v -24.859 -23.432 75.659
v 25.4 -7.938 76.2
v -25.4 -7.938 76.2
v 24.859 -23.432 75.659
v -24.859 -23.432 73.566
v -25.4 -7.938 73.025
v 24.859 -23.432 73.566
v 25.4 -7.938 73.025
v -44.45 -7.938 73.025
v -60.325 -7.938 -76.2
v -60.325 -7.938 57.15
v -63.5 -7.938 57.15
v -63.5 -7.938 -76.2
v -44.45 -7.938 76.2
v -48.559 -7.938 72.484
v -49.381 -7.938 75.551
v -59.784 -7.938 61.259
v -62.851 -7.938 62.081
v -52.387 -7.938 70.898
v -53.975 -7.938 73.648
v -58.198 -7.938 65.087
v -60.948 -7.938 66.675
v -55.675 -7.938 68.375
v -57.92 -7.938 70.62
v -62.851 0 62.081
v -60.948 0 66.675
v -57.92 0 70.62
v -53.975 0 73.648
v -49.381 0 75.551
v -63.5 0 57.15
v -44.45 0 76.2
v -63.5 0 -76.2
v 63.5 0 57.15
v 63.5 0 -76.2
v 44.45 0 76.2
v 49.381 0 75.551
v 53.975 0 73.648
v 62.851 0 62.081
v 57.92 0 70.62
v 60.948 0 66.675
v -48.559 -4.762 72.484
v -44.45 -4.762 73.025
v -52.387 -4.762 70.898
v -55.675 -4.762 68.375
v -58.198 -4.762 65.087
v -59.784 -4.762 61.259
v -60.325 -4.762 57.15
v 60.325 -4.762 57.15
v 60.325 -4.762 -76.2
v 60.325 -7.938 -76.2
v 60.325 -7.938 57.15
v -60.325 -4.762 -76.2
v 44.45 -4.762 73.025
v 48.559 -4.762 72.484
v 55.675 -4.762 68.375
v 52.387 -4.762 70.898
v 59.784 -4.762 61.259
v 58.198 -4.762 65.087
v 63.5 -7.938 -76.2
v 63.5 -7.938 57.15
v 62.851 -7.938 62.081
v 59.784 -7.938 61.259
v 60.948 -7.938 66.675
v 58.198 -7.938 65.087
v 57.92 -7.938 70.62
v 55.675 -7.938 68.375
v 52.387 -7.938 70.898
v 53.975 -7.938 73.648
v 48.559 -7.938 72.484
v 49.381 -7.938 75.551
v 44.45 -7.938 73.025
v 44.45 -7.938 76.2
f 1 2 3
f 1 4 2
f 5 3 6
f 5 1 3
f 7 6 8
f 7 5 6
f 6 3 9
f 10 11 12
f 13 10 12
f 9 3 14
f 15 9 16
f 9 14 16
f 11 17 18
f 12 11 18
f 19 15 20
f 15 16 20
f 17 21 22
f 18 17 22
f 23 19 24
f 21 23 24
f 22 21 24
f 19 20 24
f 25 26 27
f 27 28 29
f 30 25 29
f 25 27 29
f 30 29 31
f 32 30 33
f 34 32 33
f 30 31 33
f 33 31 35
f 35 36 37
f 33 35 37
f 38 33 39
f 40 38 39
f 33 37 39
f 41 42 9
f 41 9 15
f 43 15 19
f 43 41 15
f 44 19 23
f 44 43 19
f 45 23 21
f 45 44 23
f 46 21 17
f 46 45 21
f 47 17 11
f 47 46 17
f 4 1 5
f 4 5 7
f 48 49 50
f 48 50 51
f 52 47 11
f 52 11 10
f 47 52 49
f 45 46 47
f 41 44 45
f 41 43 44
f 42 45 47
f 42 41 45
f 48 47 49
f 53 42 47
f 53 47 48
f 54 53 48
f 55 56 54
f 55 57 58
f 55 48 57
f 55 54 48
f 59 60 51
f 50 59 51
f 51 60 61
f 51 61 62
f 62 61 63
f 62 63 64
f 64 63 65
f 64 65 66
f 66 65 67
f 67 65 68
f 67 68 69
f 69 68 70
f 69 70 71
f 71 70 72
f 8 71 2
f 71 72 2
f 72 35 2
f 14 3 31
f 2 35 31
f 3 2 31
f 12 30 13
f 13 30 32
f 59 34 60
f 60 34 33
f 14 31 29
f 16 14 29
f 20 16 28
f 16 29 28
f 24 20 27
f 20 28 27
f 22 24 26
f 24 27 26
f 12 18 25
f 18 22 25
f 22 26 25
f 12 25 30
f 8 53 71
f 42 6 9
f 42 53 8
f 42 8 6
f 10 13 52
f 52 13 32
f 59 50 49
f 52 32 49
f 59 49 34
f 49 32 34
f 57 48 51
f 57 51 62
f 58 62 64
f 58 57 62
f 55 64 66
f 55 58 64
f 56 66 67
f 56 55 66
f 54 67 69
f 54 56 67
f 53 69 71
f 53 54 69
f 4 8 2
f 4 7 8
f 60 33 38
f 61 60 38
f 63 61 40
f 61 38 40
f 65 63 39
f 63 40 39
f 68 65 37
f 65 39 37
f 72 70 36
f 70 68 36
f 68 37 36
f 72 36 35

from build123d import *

# Parameters (mm, degrees)
F1_DEPTH = 4.7625
F3_DEPTH = 7.9375
F4_W     = 50.8
F4_H     = 3.175
F5_DEPTH = 15.494
F5_TAPER = 2


with BuildPart() as f1:
    # F0 (on Front) → F1 (new body)
    with BuildSketch(Plane.XZ):
        with BuildLine():
            Line((-63.5, -76.2), (63.5, -76.2))
            Line((63.5, -76.2), (63.5, 57.15))
            ThreePointArc((63.5, 57.15), (57.9203841816, 70.6203841816), (44.45, 76.2))
            Line((44.45, 76.2), (-44.45, 76.2))
            ThreePointArc((-44.45, 76.2), (-57.9203841816, 70.6203841816), (-63.5, 57.15))
            Line((-63.5, 57.15), (-63.5, -76.2))
        make_face()
    extrude(amount=F1_DEPTH)

    # F2 (on face) → F3 (join)
    with BuildSketch(Plane(origin=(0, 0, 0), x_dir=(-1, 0, 0), z_dir=(0, 1, 0))):
        with BuildLine():
            ThreePointArc((-44.45, 76.2), (-57.9203841816, 70.6203841816), (-63.5, 57.15))
            Line((-63.5, 57.15), (-63.5, -76.2))
            Line((-63.5, -76.2), (-60.325, -76.2))
            Line((-60.325, -76.2), (-60.325, 57.15))
            ThreePointArc((-60.325, 57.15), (-55.6753201513, 68.3753201513), (-44.45, 73.025))
            Line((-44.45, 73.025), (44.45, 73.025))
            ThreePointArc((44.45, 73.025), (55.6753201513, 68.3753201513), (60.325, 57.15))
            Line((60.325, 57.15), (60.325, -76.2))
            Line((60.325, -76.2), (63.5, -76.2))
            Line((63.5, -76.2), (63.5, 57.15))
            ThreePointArc((63.5, 57.15), (57.9203841816, 70.6203841816), (44.45, 76.2))
            Line((44.45, 76.2), (-44.45, 76.2))
        make_face()
    extrude(amount=-F3_DEPTH)

    # F4 (on face) → F5 (join)
    with BuildSketch(Plane.XZ.offset(7.9375)):
        with Locations((0, 74.6125)):
            Rectangle(F4_W, F4_H)
    extrude(amount=F5_DEPTH, taper=F5_TAPER)


solid = f1.part
